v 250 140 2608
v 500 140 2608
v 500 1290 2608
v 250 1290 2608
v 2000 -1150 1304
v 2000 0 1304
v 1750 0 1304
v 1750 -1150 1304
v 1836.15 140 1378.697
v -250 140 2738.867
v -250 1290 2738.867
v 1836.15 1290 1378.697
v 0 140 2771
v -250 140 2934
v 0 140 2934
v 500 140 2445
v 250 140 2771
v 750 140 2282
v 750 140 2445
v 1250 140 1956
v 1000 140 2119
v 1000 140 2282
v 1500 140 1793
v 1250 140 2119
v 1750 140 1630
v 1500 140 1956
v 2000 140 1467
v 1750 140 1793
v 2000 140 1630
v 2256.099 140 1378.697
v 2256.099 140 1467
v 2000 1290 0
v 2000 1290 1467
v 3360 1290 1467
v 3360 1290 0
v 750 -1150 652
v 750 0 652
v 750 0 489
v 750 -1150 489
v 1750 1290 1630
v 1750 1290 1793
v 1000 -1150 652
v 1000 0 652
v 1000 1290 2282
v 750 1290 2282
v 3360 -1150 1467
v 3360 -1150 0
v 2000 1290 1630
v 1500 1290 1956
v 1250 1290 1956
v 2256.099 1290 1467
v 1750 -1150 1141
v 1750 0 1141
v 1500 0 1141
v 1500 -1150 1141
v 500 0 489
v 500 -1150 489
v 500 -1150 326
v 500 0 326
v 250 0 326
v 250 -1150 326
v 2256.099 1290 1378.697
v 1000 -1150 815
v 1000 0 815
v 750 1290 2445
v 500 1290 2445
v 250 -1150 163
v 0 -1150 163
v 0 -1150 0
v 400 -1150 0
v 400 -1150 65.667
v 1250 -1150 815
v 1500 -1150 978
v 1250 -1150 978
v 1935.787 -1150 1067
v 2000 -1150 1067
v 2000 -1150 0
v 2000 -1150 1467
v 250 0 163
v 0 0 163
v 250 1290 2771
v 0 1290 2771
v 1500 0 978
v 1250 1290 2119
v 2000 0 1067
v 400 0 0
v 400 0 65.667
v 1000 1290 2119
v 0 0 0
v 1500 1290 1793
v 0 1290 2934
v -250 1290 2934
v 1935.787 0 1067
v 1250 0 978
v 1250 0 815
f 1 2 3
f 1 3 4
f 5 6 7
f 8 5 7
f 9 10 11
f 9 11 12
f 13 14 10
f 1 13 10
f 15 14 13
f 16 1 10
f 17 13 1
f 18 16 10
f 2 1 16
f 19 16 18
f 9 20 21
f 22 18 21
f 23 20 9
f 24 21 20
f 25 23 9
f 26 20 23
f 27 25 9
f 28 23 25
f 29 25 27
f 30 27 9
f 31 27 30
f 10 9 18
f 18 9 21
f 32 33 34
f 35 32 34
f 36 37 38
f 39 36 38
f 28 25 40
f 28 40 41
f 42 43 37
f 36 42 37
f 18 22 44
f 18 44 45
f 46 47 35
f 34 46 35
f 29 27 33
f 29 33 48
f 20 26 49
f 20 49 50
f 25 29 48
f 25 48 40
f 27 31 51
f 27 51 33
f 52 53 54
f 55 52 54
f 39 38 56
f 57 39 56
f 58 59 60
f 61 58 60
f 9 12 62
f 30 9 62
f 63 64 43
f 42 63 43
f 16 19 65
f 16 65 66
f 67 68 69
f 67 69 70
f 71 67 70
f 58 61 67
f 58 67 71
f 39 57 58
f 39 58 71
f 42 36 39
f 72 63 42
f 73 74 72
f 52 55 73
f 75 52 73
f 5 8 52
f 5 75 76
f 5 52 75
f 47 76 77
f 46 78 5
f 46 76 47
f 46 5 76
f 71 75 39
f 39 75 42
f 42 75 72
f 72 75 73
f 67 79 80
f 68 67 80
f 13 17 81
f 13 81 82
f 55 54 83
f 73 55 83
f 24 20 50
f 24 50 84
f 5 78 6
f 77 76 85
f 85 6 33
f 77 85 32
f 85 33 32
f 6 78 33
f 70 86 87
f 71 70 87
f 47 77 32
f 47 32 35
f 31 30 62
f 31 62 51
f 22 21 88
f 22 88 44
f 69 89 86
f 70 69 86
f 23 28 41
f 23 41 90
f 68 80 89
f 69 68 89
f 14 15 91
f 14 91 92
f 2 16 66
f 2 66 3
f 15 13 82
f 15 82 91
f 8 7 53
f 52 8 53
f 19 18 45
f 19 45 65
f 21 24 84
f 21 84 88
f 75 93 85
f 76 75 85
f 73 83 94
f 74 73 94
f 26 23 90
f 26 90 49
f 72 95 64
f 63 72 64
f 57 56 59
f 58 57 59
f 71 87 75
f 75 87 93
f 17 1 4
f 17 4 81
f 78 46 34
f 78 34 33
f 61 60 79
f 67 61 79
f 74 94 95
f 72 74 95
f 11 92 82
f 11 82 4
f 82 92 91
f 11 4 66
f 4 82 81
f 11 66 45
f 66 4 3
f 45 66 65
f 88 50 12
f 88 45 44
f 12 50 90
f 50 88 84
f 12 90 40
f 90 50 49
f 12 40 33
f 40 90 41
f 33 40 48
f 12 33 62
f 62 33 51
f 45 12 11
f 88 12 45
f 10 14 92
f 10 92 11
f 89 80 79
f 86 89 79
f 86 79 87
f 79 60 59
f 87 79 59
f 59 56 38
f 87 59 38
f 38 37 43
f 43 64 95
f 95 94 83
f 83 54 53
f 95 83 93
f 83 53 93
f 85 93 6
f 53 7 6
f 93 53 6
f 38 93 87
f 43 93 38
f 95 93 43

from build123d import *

# Parameters (mm, degrees)
F1_DEPTH = 1150
F4_DEPTH = 1150
F5_W     = 1360
F5_H     = 2440
F6_DEPTH = 1467


with BuildPart() as f1:
    # F0 (on Front) → F1 (new body)
    with BuildSketch(Plane.XZ):
        Polygon((0, 163), (0, 0), (400, 0), (400, 65.6668404071), (1935.7870545904, 1067), (2250, 1067), (2250, 1467), (2000, 1467), (2000, 1304), (1750, 1304), (1750, 1141), (1500, 1141), (1500, 978), (1250, 978), (1250, 815), (1000, 815), (1000, 652), (750, 652), (750, 489), (500, 489), (500, 326), (250, 326), (250, 163), align=None)
    extrude(amount=F1_DEPTH)

    # F5 (on Top) → F6 (join)
    with BuildSketch(Plane.XY):
        with Locations((2680, 70)):
            Rectangle(F5_W, F5_H)
    extrude(amount=F6_DEPTH)


with BuildPart() as f4:
    # F3 (on offset) → F4 (new body)
    with BuildSketch(Plane.XZ.offset(-140)):
        Polygon((2000, 1630), (1750, 1630), (1750, 1793), (1500, 1793), (1500, 1956), (1250, 1956), (1250, 2119), (1000, 2119), (1000, 2282), (750, 2282), (750, 2445), (500, 2445), (500, 2608), (250, 2608), (250, 2771), (0, 2771), (0, 2934), (-250, 2934), (-250, 2738.8668404071), (1836.1503300429, 1378.6968252191), (2256.0992240906, 1378.6968252191), (2256.0992240906, 1467), (2000, 1467), align=None)
    extrude(amount=-F4_DEPTH)


solid = Compound([f1.part, f4.part])
